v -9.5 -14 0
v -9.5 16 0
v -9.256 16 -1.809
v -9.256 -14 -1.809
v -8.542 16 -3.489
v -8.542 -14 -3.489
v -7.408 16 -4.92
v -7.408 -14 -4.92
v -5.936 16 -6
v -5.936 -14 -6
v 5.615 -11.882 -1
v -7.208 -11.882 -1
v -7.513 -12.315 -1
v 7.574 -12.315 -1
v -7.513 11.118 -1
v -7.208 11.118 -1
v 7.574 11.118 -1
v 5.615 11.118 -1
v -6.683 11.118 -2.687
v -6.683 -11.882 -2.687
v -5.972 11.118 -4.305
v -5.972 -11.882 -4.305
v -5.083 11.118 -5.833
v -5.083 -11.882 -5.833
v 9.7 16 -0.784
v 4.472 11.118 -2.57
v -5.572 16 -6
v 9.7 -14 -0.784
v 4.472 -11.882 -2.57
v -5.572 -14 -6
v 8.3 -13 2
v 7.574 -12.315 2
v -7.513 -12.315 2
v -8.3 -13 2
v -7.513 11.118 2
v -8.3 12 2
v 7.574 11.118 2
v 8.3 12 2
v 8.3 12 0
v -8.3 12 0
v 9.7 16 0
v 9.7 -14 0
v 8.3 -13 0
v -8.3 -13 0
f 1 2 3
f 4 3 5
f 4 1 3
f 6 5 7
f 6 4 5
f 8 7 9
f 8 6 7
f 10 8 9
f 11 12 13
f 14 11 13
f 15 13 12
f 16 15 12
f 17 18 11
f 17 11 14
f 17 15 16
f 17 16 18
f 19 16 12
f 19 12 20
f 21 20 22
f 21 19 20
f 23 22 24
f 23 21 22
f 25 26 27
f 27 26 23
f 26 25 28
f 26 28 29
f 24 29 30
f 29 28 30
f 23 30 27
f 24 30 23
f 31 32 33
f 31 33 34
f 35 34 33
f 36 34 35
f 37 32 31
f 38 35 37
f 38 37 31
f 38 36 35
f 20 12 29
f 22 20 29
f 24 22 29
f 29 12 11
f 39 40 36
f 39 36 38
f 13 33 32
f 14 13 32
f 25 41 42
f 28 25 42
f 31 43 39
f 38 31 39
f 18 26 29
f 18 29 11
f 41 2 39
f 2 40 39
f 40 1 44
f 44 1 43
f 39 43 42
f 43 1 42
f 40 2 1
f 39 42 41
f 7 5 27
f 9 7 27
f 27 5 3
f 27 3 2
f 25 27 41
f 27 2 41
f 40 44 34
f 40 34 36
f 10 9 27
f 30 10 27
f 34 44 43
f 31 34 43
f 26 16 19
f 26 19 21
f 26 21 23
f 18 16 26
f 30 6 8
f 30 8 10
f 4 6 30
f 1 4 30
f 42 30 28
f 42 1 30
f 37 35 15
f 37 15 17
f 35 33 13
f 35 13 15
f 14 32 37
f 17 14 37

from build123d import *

# Parameters (mm, degrees)
SKETCH_W        = 16.6
SKETCH_H        = 25
PAD_DEPTH       = 2
SKETCH001_W     = 19.4
SKETCH001_H     = 30
PAD001_DEPTH    = 6
POCKET_DEPTH    = 30.001
SKETCH003_W     = 15.087606
SKETCH003_H     = 23.432943
POCKET001_DEPTH = 3
POCKET002_DEPTH = 23


with BuildPart() as part:
    # Sketch → Pad (new body)
    with BuildSketch(Plane.XY):
        with Locations((0, -0.5)):
            Rectangle(SKETCH_W, SKETCH_H)
    extrude(amount=PAD_DEPTH)

    # Sketch001 (on Face5 of Pad) → Pad001 (join)
    with BuildSketch(Plane(origin=(0, 0, 0), x_dir=(1, 0, 0), z_dir=(0, 0, -1))):
        with Locations((0, -1)):
            Rectangle(SKETCH001_W, SKETCH001_H)
    extrude(amount=PAD001_DEPTH)

    # Sketch002 (on Face1 of Pad001) → Pocket (cut, through all)
    with BuildSketch(Plane.XZ.offset(14)):
        with BuildLine():
            ThreePointArc((-9.5, 0), (-8.500128, -3.558582), (-5.793155, -6.075635))
            Line((10.964428, -0.352326), (-5.793155, -6.075635))
            Line((10.964428, -0.352326), (10.392425, -13.720259))
            Line((10.392425, -13.720259), (-15.284175, -12.512696))
            Line((-9.5, 2.985816), (-15.284175, -12.512696))
            Line((-9.5, 0), (-9.5, 2.985816))
        make_face()
    extrude(amount=-POCKET_DEPTH, mode=Mode.SUBTRACT)

    # Sketch003 (on Face12 of Pocket) → Pocket001 (cut)
    with BuildSketch(Plane.XY.offset(2)):
        with Locations((0.03044, -0.598662)):
            Rectangle(SKETCH003_W, SKETCH003_H)
    extrude(amount=-POCKET001_DEPTH, mode=Mode.SUBTRACT)

    # Sketch004 (on Face13 of Pocket001) → Pocket002 (cut)
    with BuildSketch(Plane.XZ.offset(-11.117809)):
        with BuildLine():
            Line((7.061974, 0.986589), (-7.423936, 0))
            ThreePointArc((-7.423936, 0), (-5.193689, -5.663316), (-0.979385, -10.054988))
            Line((-0.979385, -10.054988), (7.061974, 0.986589))
        make_face()
    extrude(amount=POCKET002_DEPTH, mode=Mode.SUBTRACT)


solid = part.part
